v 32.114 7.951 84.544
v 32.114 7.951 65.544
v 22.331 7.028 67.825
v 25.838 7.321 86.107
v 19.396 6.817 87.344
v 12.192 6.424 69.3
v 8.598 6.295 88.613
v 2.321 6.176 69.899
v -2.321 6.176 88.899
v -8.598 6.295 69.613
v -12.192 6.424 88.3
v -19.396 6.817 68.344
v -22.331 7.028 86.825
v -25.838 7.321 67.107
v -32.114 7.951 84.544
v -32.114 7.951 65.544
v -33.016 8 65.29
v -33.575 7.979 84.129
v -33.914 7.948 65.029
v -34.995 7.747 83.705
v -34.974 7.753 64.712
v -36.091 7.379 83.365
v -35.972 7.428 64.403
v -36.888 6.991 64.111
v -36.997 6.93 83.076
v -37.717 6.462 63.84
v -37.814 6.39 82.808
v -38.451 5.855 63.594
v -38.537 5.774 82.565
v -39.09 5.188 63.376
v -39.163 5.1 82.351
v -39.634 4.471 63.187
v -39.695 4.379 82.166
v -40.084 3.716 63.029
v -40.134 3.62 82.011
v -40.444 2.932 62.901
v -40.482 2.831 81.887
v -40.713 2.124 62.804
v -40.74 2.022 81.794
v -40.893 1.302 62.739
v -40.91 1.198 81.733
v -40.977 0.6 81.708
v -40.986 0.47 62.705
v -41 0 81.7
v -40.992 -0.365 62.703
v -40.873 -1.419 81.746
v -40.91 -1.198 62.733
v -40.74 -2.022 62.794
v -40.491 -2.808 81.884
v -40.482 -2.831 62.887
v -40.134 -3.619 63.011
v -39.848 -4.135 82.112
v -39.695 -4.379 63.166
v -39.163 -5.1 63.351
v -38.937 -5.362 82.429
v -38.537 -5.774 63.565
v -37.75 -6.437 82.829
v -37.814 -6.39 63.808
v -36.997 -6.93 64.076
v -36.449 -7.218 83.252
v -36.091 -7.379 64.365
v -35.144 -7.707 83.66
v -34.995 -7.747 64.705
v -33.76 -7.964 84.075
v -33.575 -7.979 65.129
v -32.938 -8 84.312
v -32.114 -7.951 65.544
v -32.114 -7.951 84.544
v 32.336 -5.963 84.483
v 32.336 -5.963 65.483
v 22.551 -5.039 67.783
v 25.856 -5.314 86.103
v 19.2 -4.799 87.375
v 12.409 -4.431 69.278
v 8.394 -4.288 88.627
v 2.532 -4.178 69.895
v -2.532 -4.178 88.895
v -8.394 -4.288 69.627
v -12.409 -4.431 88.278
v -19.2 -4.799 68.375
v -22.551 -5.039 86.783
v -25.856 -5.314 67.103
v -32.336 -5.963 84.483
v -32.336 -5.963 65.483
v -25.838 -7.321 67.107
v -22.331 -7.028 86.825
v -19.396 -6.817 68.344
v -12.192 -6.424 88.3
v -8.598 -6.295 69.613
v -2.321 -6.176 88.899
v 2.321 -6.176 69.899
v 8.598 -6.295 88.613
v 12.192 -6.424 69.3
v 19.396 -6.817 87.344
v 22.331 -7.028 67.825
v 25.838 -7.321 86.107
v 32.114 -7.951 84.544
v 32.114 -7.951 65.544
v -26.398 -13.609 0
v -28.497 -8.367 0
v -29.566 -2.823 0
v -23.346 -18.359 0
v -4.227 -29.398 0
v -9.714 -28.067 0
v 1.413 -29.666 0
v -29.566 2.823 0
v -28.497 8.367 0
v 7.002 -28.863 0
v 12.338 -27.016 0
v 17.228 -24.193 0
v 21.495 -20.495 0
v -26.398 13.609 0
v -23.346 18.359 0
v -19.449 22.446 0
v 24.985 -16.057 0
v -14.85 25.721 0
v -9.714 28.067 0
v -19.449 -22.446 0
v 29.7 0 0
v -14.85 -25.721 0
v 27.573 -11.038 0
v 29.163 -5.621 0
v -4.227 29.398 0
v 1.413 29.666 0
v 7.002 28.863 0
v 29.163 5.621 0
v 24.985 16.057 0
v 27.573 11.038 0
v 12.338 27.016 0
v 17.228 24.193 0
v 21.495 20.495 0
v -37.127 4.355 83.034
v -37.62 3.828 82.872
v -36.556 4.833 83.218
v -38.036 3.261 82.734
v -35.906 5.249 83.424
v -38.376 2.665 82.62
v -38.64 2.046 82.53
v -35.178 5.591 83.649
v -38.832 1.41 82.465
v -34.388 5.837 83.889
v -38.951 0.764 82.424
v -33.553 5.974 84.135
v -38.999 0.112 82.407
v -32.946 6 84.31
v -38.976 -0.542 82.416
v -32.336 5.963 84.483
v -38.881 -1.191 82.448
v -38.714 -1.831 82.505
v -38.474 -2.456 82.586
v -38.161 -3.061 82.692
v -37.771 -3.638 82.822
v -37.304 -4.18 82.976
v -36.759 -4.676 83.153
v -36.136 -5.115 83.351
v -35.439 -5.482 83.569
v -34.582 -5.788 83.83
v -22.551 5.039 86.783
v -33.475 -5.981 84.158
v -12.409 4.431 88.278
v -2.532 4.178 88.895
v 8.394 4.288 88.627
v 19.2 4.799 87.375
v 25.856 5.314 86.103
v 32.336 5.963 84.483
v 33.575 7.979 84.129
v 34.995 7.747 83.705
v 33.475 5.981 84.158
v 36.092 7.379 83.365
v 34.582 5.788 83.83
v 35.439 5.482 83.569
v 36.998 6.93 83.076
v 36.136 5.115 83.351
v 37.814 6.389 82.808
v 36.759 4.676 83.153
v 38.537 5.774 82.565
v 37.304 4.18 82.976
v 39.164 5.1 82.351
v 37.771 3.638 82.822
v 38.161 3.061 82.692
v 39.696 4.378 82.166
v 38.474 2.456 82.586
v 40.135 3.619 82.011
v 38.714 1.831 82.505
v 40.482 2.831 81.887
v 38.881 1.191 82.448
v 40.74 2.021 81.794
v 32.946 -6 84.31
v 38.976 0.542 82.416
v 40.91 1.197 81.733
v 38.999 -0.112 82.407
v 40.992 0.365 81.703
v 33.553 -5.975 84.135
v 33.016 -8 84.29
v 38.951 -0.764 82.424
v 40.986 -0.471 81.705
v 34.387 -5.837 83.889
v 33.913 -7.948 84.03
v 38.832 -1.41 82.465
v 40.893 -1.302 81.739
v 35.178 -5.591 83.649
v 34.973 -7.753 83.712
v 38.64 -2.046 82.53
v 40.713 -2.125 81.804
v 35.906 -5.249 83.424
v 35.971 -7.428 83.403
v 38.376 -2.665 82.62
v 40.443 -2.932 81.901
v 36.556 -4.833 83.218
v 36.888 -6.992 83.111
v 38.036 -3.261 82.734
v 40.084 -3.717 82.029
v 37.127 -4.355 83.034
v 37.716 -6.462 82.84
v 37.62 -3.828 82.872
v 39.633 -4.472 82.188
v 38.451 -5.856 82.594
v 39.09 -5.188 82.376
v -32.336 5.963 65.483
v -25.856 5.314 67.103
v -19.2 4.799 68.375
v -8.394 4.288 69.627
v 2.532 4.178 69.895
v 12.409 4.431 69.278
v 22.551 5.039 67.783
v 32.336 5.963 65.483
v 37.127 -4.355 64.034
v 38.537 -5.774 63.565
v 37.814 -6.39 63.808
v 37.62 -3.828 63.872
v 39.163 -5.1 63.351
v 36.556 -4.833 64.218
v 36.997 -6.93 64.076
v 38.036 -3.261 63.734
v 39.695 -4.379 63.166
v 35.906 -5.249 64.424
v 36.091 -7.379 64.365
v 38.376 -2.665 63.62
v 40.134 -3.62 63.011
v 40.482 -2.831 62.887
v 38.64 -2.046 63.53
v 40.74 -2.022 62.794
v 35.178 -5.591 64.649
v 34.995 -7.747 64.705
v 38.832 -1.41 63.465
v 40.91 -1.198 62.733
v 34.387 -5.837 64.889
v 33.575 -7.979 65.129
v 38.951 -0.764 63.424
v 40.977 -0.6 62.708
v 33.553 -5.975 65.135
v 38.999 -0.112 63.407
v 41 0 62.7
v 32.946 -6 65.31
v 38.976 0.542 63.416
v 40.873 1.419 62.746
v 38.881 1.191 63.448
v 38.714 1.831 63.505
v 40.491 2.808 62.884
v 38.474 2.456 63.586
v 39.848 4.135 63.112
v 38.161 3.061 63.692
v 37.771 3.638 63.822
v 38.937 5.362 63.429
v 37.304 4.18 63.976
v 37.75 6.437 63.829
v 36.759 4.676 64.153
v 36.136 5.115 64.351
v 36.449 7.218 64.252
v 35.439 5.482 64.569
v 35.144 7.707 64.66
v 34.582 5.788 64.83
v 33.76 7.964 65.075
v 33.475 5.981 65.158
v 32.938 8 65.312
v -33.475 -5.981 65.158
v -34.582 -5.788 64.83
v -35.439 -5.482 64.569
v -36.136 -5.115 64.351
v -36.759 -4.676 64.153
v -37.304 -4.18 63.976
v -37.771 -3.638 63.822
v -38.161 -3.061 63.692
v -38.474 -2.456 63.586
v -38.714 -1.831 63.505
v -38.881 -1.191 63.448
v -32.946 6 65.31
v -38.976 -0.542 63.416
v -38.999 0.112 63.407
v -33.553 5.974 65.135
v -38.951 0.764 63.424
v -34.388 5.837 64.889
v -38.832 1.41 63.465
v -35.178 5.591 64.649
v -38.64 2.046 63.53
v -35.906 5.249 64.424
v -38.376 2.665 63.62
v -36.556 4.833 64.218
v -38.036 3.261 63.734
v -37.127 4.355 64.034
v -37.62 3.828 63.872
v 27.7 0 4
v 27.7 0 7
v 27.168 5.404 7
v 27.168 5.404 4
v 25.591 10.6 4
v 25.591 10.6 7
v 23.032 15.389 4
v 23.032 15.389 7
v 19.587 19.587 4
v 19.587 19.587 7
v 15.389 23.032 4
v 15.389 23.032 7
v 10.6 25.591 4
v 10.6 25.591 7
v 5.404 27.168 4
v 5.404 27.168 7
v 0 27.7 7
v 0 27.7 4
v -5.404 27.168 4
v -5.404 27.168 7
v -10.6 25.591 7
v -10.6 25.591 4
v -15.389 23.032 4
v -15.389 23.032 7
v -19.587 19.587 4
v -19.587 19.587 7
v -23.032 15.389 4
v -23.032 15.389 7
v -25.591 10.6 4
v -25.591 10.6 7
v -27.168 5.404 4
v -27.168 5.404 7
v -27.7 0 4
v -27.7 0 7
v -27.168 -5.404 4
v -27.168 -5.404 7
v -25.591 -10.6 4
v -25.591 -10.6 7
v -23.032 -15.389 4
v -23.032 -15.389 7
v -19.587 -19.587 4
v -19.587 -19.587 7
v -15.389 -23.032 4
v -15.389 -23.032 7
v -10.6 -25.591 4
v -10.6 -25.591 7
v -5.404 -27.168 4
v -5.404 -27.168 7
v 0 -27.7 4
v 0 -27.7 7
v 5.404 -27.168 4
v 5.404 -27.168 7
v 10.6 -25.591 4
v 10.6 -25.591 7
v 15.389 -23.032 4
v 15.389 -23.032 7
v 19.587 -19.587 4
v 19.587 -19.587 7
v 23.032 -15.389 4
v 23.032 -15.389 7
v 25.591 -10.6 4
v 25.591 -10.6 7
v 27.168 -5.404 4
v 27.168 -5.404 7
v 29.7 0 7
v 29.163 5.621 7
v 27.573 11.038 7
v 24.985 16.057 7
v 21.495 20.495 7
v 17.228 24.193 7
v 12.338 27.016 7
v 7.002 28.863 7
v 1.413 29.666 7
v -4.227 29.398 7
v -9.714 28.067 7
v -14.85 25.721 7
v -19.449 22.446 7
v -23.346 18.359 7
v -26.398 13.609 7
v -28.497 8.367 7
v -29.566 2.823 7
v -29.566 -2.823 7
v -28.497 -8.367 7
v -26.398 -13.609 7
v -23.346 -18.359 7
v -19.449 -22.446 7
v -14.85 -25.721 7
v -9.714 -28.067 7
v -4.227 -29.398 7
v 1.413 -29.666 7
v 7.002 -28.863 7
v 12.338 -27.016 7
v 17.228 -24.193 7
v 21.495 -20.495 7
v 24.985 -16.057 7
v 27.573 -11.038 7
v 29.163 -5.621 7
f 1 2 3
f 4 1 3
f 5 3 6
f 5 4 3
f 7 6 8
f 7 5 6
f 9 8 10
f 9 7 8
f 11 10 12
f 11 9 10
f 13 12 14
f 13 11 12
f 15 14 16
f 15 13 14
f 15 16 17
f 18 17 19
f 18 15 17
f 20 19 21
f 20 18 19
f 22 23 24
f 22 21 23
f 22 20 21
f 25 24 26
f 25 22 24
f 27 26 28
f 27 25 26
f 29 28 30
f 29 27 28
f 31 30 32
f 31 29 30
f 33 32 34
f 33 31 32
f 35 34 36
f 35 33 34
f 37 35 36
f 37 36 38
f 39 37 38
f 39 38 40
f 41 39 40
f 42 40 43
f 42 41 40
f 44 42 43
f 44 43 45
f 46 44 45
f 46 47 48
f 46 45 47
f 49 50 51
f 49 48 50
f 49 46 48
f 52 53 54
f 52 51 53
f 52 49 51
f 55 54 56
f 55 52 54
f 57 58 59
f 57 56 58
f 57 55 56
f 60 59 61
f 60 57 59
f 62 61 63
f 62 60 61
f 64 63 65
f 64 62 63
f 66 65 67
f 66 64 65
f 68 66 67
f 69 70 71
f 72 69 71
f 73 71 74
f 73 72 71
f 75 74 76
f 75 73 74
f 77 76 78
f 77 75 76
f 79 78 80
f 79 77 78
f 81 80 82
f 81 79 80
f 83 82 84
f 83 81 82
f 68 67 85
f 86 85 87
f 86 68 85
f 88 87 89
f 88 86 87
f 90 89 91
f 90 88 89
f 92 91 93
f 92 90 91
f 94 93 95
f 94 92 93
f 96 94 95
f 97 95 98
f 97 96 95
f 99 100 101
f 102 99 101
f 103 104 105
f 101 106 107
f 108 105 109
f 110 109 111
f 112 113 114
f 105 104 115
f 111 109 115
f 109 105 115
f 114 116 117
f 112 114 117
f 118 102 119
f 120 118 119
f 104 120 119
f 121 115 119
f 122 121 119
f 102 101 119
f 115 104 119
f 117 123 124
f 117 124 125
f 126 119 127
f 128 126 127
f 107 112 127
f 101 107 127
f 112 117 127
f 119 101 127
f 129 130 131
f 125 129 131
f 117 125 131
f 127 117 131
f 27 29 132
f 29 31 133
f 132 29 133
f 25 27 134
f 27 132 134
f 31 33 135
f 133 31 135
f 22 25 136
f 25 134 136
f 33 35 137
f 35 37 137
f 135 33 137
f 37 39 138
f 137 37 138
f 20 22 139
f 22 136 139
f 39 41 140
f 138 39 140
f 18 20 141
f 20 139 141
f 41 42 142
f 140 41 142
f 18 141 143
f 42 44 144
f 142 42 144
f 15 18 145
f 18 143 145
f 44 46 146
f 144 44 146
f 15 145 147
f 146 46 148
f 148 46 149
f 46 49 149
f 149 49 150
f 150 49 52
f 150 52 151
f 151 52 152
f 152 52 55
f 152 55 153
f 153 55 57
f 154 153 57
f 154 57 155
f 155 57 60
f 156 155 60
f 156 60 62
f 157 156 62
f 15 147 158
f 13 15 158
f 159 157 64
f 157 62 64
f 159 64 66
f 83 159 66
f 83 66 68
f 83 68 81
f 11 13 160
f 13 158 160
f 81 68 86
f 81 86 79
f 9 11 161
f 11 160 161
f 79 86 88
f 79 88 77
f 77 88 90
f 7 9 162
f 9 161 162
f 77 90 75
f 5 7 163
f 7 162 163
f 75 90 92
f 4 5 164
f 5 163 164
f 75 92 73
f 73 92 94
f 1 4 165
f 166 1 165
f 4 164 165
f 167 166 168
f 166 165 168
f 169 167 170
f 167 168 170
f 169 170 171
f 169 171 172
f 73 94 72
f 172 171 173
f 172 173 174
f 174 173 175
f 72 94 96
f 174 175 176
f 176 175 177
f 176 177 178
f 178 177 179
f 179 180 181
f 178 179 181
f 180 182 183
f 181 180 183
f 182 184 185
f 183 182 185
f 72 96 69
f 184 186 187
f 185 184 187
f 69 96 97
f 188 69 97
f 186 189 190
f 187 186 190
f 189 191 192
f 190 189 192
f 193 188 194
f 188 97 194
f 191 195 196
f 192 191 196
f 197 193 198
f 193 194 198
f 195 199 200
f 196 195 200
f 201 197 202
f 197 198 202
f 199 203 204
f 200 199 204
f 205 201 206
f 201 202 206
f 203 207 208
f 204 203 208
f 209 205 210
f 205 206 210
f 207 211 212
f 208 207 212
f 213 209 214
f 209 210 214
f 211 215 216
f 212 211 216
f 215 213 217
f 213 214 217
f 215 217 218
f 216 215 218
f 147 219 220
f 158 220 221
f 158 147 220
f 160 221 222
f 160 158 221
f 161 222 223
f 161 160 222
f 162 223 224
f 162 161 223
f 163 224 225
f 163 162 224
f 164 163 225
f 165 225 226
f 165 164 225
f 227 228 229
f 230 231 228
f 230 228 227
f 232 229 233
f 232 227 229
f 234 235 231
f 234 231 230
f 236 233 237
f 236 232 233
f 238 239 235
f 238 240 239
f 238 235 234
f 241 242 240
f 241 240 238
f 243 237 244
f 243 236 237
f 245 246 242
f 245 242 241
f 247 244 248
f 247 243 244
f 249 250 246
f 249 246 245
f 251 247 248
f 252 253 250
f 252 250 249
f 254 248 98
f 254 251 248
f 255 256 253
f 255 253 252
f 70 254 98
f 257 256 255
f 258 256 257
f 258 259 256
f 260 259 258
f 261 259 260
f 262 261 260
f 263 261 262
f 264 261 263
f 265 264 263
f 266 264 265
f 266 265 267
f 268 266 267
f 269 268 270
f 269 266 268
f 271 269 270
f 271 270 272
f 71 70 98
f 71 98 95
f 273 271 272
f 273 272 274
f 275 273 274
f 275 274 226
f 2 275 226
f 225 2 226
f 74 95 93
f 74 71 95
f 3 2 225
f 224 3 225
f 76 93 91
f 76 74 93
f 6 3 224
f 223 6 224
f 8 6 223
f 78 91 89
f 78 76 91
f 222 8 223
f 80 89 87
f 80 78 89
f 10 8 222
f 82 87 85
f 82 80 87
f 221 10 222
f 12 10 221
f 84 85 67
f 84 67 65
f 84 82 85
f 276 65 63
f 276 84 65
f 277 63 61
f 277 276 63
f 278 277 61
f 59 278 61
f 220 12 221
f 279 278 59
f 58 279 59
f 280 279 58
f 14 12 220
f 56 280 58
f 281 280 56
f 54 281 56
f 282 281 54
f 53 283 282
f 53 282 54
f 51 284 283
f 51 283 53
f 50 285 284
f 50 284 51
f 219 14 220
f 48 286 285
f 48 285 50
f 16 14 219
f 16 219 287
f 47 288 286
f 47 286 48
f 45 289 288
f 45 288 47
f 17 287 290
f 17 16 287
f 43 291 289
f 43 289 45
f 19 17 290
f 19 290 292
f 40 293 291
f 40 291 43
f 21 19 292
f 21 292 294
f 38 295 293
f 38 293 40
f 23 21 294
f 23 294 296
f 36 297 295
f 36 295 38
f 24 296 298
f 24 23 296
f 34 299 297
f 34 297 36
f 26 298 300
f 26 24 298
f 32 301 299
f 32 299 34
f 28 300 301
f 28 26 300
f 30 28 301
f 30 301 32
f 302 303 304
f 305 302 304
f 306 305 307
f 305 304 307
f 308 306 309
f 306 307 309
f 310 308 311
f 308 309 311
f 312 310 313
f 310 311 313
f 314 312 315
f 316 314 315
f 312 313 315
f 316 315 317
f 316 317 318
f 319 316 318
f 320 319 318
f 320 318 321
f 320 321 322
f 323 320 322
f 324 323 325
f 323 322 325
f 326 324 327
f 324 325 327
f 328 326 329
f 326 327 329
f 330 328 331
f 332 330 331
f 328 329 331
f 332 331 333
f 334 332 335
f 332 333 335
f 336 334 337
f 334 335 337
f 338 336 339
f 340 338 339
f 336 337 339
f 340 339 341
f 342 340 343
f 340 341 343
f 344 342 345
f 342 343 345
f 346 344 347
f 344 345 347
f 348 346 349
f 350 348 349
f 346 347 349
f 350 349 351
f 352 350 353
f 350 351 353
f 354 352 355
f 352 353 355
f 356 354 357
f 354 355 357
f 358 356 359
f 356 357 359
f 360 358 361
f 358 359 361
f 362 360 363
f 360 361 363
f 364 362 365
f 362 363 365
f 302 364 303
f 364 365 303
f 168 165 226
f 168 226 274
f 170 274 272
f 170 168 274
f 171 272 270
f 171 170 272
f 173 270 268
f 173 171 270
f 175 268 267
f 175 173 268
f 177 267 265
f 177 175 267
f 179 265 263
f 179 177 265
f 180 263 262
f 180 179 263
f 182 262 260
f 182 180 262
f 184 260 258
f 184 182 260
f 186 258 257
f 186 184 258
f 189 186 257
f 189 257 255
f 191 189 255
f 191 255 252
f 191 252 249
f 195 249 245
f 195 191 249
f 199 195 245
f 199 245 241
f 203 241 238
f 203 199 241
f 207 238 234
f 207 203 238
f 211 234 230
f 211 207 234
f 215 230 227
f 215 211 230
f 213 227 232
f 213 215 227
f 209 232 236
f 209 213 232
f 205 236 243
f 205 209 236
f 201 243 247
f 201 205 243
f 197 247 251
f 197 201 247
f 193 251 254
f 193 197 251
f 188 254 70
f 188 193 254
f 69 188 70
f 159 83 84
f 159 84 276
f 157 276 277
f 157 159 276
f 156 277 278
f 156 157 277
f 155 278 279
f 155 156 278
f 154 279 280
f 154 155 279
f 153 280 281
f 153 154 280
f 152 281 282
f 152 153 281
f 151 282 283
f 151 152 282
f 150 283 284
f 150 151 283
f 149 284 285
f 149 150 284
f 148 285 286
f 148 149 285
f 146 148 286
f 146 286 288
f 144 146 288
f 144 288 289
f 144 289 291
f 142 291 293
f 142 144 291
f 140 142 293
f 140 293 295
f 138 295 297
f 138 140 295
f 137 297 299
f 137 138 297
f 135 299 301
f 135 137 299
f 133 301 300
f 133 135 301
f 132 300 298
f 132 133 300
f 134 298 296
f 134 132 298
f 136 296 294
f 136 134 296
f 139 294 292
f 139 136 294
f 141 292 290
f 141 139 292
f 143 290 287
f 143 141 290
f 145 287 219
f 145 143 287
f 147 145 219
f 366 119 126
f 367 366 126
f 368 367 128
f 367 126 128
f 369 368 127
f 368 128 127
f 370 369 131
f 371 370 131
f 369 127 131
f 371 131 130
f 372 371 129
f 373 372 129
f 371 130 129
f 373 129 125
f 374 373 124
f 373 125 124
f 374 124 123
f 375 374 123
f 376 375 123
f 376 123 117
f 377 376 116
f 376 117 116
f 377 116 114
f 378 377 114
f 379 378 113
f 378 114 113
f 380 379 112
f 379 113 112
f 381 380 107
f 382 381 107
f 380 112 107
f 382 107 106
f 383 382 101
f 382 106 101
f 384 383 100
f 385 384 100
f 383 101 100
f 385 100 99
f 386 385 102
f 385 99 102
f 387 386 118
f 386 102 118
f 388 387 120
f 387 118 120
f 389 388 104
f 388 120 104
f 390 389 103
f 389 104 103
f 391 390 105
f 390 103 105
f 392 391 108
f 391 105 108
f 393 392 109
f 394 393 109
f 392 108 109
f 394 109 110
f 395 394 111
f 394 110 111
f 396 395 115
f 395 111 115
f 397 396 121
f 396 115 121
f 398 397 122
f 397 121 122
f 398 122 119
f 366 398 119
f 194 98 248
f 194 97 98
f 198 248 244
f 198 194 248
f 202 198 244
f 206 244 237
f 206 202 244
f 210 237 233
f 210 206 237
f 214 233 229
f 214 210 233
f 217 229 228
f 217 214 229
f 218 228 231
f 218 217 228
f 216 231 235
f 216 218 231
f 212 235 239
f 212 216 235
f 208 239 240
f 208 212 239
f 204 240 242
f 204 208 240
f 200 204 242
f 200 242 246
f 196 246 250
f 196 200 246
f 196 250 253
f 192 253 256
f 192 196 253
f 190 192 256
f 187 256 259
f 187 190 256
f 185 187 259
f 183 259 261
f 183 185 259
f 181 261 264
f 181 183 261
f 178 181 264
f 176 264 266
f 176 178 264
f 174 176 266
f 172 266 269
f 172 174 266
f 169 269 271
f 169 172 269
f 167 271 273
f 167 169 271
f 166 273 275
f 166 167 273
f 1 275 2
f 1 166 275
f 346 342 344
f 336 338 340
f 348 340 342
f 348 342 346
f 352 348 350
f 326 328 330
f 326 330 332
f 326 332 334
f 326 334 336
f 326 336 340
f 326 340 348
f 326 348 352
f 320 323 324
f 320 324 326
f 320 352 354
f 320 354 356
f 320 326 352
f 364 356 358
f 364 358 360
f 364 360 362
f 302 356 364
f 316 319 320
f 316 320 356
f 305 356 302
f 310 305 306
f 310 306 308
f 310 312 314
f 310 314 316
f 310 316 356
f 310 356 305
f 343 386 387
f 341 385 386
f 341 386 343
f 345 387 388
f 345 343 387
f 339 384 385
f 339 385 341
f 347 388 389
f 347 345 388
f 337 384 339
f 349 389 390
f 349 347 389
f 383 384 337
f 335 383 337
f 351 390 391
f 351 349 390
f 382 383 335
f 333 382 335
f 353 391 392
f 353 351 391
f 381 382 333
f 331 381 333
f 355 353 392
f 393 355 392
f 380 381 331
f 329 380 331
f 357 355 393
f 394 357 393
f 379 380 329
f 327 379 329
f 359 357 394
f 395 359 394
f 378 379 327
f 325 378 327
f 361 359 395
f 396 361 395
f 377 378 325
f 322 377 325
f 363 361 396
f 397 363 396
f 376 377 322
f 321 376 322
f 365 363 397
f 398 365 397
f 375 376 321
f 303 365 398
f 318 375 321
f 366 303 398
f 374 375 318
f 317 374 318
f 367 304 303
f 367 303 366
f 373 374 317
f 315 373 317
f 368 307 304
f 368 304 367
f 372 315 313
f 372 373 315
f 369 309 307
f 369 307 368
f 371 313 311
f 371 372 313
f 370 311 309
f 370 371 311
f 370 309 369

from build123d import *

# Parameters (mm, degrees)
SKETCH1_R           = 29.7
BOSS_EXTRUDE1_DEPTH = 7
BOSS_EXTRUDE2_DEPTH = 20
CUT_EXTRUDE1_DEPTH  = 20
SKETCH4_R           = 27.7
CUT_EXTRUDE2_DEPTH  = 3


with BuildPart() as part:
    # Sketch1 → Boss-Extrude1 (new body)
    with BuildSketch(Plane.XY):
        Circle(SKETCH1_R)
    extrude(amount=BOSS_EXTRUDE1_DEPTH)

    # Sketch4 → Cut-Extrude2 (cut)
    with BuildSketch(Plane.XY.offset(7)):
        Circle(SKETCH4_R)
    extrude(amount=-CUT_EXTRUDE2_DEPTH, mode=Mode.SUBTRACT)


with BuildPart() as body_2:
    # Sketch2 → Boss-Extrude2 (new, symmetric)
    with BuildSketch(Plane.XY.offset(82.7)):
        with BuildLine():
            ThreePointArc((32.11409396, -7.950796846), (41, 0), (32.11409396, 7.950796846))
            ThreePointArc((32.11409396, 7.950796846), (0, 6.167182517), (-32.11409396, 7.950796846))
            ThreePointArc((-32.11409396, 7.950796846), (-41, 0), (-32.11409396, -7.950796846))
            ThreePointArc((-32.11409396, -7.950796846), (0, -6.167182517), (32.11409396, -7.950796846))
        make_face()
        with BuildLine():
            ThreePointArc((-32.33557047, 5.963097635), (0, 4.167182517), (32.33557047, 5.963097635))
            ThreePointArc((32.33557047, 5.963097635), (39, 0), (32.33557047, -5.963097635))
            ThreePointArc((32.33557047, -5.963097635), (0, -4.167182517), (-32.33557047, -5.963097635))
            ThreePointArc((-32.33557047, -5.963097635), (-39, 0), (-32.33557047, 5.963097635))
        make_face(mode=Mode.SUBTRACT)
    extrude(amount=BOSS_EXTRUDE2_DEPTH, both=True)

    # Sketch3 → Cut-Extrude1 (cut, symmetric)
    with BuildSketch(Plane(origin=(0, 0, 0), x_dir=(1, 0, 0), z_dir=(0, 1, 0))):
        with BuildLine():
            ThreePointArc((-41, -81.7), (0, -88.921455941), (41, -81.7))
            Line((41, -81.7), (103.064038999, -103.38833583))
            Line((103.064038999, -103.38833583), (16.872750213, -172.184638386))
            Line((16.872750213, -172.184638386), (-81.449068681, -125.07667166))
            Line((-81.449068681, -125.07667166), (-41, -81.7))
        make_face()
        with BuildLine():
            Line((-41, -62.7), (13.340762668, -29.679350995))
            Line((13.340762668, -29.679350995), (58.396937956, -46.189675497))
            Line((58.396937956, -46.189675497), (41, -62.7))
            ThreePointArc((41, -62.7), (0, -69.921455941), (-41, -62.7))
        make_face()
    extrude(amount=CUT_EXTRUDE1_DEPTH, both=True, mode=Mode.SUBTRACT)


solid = Compound([part.part, body_2.part])
